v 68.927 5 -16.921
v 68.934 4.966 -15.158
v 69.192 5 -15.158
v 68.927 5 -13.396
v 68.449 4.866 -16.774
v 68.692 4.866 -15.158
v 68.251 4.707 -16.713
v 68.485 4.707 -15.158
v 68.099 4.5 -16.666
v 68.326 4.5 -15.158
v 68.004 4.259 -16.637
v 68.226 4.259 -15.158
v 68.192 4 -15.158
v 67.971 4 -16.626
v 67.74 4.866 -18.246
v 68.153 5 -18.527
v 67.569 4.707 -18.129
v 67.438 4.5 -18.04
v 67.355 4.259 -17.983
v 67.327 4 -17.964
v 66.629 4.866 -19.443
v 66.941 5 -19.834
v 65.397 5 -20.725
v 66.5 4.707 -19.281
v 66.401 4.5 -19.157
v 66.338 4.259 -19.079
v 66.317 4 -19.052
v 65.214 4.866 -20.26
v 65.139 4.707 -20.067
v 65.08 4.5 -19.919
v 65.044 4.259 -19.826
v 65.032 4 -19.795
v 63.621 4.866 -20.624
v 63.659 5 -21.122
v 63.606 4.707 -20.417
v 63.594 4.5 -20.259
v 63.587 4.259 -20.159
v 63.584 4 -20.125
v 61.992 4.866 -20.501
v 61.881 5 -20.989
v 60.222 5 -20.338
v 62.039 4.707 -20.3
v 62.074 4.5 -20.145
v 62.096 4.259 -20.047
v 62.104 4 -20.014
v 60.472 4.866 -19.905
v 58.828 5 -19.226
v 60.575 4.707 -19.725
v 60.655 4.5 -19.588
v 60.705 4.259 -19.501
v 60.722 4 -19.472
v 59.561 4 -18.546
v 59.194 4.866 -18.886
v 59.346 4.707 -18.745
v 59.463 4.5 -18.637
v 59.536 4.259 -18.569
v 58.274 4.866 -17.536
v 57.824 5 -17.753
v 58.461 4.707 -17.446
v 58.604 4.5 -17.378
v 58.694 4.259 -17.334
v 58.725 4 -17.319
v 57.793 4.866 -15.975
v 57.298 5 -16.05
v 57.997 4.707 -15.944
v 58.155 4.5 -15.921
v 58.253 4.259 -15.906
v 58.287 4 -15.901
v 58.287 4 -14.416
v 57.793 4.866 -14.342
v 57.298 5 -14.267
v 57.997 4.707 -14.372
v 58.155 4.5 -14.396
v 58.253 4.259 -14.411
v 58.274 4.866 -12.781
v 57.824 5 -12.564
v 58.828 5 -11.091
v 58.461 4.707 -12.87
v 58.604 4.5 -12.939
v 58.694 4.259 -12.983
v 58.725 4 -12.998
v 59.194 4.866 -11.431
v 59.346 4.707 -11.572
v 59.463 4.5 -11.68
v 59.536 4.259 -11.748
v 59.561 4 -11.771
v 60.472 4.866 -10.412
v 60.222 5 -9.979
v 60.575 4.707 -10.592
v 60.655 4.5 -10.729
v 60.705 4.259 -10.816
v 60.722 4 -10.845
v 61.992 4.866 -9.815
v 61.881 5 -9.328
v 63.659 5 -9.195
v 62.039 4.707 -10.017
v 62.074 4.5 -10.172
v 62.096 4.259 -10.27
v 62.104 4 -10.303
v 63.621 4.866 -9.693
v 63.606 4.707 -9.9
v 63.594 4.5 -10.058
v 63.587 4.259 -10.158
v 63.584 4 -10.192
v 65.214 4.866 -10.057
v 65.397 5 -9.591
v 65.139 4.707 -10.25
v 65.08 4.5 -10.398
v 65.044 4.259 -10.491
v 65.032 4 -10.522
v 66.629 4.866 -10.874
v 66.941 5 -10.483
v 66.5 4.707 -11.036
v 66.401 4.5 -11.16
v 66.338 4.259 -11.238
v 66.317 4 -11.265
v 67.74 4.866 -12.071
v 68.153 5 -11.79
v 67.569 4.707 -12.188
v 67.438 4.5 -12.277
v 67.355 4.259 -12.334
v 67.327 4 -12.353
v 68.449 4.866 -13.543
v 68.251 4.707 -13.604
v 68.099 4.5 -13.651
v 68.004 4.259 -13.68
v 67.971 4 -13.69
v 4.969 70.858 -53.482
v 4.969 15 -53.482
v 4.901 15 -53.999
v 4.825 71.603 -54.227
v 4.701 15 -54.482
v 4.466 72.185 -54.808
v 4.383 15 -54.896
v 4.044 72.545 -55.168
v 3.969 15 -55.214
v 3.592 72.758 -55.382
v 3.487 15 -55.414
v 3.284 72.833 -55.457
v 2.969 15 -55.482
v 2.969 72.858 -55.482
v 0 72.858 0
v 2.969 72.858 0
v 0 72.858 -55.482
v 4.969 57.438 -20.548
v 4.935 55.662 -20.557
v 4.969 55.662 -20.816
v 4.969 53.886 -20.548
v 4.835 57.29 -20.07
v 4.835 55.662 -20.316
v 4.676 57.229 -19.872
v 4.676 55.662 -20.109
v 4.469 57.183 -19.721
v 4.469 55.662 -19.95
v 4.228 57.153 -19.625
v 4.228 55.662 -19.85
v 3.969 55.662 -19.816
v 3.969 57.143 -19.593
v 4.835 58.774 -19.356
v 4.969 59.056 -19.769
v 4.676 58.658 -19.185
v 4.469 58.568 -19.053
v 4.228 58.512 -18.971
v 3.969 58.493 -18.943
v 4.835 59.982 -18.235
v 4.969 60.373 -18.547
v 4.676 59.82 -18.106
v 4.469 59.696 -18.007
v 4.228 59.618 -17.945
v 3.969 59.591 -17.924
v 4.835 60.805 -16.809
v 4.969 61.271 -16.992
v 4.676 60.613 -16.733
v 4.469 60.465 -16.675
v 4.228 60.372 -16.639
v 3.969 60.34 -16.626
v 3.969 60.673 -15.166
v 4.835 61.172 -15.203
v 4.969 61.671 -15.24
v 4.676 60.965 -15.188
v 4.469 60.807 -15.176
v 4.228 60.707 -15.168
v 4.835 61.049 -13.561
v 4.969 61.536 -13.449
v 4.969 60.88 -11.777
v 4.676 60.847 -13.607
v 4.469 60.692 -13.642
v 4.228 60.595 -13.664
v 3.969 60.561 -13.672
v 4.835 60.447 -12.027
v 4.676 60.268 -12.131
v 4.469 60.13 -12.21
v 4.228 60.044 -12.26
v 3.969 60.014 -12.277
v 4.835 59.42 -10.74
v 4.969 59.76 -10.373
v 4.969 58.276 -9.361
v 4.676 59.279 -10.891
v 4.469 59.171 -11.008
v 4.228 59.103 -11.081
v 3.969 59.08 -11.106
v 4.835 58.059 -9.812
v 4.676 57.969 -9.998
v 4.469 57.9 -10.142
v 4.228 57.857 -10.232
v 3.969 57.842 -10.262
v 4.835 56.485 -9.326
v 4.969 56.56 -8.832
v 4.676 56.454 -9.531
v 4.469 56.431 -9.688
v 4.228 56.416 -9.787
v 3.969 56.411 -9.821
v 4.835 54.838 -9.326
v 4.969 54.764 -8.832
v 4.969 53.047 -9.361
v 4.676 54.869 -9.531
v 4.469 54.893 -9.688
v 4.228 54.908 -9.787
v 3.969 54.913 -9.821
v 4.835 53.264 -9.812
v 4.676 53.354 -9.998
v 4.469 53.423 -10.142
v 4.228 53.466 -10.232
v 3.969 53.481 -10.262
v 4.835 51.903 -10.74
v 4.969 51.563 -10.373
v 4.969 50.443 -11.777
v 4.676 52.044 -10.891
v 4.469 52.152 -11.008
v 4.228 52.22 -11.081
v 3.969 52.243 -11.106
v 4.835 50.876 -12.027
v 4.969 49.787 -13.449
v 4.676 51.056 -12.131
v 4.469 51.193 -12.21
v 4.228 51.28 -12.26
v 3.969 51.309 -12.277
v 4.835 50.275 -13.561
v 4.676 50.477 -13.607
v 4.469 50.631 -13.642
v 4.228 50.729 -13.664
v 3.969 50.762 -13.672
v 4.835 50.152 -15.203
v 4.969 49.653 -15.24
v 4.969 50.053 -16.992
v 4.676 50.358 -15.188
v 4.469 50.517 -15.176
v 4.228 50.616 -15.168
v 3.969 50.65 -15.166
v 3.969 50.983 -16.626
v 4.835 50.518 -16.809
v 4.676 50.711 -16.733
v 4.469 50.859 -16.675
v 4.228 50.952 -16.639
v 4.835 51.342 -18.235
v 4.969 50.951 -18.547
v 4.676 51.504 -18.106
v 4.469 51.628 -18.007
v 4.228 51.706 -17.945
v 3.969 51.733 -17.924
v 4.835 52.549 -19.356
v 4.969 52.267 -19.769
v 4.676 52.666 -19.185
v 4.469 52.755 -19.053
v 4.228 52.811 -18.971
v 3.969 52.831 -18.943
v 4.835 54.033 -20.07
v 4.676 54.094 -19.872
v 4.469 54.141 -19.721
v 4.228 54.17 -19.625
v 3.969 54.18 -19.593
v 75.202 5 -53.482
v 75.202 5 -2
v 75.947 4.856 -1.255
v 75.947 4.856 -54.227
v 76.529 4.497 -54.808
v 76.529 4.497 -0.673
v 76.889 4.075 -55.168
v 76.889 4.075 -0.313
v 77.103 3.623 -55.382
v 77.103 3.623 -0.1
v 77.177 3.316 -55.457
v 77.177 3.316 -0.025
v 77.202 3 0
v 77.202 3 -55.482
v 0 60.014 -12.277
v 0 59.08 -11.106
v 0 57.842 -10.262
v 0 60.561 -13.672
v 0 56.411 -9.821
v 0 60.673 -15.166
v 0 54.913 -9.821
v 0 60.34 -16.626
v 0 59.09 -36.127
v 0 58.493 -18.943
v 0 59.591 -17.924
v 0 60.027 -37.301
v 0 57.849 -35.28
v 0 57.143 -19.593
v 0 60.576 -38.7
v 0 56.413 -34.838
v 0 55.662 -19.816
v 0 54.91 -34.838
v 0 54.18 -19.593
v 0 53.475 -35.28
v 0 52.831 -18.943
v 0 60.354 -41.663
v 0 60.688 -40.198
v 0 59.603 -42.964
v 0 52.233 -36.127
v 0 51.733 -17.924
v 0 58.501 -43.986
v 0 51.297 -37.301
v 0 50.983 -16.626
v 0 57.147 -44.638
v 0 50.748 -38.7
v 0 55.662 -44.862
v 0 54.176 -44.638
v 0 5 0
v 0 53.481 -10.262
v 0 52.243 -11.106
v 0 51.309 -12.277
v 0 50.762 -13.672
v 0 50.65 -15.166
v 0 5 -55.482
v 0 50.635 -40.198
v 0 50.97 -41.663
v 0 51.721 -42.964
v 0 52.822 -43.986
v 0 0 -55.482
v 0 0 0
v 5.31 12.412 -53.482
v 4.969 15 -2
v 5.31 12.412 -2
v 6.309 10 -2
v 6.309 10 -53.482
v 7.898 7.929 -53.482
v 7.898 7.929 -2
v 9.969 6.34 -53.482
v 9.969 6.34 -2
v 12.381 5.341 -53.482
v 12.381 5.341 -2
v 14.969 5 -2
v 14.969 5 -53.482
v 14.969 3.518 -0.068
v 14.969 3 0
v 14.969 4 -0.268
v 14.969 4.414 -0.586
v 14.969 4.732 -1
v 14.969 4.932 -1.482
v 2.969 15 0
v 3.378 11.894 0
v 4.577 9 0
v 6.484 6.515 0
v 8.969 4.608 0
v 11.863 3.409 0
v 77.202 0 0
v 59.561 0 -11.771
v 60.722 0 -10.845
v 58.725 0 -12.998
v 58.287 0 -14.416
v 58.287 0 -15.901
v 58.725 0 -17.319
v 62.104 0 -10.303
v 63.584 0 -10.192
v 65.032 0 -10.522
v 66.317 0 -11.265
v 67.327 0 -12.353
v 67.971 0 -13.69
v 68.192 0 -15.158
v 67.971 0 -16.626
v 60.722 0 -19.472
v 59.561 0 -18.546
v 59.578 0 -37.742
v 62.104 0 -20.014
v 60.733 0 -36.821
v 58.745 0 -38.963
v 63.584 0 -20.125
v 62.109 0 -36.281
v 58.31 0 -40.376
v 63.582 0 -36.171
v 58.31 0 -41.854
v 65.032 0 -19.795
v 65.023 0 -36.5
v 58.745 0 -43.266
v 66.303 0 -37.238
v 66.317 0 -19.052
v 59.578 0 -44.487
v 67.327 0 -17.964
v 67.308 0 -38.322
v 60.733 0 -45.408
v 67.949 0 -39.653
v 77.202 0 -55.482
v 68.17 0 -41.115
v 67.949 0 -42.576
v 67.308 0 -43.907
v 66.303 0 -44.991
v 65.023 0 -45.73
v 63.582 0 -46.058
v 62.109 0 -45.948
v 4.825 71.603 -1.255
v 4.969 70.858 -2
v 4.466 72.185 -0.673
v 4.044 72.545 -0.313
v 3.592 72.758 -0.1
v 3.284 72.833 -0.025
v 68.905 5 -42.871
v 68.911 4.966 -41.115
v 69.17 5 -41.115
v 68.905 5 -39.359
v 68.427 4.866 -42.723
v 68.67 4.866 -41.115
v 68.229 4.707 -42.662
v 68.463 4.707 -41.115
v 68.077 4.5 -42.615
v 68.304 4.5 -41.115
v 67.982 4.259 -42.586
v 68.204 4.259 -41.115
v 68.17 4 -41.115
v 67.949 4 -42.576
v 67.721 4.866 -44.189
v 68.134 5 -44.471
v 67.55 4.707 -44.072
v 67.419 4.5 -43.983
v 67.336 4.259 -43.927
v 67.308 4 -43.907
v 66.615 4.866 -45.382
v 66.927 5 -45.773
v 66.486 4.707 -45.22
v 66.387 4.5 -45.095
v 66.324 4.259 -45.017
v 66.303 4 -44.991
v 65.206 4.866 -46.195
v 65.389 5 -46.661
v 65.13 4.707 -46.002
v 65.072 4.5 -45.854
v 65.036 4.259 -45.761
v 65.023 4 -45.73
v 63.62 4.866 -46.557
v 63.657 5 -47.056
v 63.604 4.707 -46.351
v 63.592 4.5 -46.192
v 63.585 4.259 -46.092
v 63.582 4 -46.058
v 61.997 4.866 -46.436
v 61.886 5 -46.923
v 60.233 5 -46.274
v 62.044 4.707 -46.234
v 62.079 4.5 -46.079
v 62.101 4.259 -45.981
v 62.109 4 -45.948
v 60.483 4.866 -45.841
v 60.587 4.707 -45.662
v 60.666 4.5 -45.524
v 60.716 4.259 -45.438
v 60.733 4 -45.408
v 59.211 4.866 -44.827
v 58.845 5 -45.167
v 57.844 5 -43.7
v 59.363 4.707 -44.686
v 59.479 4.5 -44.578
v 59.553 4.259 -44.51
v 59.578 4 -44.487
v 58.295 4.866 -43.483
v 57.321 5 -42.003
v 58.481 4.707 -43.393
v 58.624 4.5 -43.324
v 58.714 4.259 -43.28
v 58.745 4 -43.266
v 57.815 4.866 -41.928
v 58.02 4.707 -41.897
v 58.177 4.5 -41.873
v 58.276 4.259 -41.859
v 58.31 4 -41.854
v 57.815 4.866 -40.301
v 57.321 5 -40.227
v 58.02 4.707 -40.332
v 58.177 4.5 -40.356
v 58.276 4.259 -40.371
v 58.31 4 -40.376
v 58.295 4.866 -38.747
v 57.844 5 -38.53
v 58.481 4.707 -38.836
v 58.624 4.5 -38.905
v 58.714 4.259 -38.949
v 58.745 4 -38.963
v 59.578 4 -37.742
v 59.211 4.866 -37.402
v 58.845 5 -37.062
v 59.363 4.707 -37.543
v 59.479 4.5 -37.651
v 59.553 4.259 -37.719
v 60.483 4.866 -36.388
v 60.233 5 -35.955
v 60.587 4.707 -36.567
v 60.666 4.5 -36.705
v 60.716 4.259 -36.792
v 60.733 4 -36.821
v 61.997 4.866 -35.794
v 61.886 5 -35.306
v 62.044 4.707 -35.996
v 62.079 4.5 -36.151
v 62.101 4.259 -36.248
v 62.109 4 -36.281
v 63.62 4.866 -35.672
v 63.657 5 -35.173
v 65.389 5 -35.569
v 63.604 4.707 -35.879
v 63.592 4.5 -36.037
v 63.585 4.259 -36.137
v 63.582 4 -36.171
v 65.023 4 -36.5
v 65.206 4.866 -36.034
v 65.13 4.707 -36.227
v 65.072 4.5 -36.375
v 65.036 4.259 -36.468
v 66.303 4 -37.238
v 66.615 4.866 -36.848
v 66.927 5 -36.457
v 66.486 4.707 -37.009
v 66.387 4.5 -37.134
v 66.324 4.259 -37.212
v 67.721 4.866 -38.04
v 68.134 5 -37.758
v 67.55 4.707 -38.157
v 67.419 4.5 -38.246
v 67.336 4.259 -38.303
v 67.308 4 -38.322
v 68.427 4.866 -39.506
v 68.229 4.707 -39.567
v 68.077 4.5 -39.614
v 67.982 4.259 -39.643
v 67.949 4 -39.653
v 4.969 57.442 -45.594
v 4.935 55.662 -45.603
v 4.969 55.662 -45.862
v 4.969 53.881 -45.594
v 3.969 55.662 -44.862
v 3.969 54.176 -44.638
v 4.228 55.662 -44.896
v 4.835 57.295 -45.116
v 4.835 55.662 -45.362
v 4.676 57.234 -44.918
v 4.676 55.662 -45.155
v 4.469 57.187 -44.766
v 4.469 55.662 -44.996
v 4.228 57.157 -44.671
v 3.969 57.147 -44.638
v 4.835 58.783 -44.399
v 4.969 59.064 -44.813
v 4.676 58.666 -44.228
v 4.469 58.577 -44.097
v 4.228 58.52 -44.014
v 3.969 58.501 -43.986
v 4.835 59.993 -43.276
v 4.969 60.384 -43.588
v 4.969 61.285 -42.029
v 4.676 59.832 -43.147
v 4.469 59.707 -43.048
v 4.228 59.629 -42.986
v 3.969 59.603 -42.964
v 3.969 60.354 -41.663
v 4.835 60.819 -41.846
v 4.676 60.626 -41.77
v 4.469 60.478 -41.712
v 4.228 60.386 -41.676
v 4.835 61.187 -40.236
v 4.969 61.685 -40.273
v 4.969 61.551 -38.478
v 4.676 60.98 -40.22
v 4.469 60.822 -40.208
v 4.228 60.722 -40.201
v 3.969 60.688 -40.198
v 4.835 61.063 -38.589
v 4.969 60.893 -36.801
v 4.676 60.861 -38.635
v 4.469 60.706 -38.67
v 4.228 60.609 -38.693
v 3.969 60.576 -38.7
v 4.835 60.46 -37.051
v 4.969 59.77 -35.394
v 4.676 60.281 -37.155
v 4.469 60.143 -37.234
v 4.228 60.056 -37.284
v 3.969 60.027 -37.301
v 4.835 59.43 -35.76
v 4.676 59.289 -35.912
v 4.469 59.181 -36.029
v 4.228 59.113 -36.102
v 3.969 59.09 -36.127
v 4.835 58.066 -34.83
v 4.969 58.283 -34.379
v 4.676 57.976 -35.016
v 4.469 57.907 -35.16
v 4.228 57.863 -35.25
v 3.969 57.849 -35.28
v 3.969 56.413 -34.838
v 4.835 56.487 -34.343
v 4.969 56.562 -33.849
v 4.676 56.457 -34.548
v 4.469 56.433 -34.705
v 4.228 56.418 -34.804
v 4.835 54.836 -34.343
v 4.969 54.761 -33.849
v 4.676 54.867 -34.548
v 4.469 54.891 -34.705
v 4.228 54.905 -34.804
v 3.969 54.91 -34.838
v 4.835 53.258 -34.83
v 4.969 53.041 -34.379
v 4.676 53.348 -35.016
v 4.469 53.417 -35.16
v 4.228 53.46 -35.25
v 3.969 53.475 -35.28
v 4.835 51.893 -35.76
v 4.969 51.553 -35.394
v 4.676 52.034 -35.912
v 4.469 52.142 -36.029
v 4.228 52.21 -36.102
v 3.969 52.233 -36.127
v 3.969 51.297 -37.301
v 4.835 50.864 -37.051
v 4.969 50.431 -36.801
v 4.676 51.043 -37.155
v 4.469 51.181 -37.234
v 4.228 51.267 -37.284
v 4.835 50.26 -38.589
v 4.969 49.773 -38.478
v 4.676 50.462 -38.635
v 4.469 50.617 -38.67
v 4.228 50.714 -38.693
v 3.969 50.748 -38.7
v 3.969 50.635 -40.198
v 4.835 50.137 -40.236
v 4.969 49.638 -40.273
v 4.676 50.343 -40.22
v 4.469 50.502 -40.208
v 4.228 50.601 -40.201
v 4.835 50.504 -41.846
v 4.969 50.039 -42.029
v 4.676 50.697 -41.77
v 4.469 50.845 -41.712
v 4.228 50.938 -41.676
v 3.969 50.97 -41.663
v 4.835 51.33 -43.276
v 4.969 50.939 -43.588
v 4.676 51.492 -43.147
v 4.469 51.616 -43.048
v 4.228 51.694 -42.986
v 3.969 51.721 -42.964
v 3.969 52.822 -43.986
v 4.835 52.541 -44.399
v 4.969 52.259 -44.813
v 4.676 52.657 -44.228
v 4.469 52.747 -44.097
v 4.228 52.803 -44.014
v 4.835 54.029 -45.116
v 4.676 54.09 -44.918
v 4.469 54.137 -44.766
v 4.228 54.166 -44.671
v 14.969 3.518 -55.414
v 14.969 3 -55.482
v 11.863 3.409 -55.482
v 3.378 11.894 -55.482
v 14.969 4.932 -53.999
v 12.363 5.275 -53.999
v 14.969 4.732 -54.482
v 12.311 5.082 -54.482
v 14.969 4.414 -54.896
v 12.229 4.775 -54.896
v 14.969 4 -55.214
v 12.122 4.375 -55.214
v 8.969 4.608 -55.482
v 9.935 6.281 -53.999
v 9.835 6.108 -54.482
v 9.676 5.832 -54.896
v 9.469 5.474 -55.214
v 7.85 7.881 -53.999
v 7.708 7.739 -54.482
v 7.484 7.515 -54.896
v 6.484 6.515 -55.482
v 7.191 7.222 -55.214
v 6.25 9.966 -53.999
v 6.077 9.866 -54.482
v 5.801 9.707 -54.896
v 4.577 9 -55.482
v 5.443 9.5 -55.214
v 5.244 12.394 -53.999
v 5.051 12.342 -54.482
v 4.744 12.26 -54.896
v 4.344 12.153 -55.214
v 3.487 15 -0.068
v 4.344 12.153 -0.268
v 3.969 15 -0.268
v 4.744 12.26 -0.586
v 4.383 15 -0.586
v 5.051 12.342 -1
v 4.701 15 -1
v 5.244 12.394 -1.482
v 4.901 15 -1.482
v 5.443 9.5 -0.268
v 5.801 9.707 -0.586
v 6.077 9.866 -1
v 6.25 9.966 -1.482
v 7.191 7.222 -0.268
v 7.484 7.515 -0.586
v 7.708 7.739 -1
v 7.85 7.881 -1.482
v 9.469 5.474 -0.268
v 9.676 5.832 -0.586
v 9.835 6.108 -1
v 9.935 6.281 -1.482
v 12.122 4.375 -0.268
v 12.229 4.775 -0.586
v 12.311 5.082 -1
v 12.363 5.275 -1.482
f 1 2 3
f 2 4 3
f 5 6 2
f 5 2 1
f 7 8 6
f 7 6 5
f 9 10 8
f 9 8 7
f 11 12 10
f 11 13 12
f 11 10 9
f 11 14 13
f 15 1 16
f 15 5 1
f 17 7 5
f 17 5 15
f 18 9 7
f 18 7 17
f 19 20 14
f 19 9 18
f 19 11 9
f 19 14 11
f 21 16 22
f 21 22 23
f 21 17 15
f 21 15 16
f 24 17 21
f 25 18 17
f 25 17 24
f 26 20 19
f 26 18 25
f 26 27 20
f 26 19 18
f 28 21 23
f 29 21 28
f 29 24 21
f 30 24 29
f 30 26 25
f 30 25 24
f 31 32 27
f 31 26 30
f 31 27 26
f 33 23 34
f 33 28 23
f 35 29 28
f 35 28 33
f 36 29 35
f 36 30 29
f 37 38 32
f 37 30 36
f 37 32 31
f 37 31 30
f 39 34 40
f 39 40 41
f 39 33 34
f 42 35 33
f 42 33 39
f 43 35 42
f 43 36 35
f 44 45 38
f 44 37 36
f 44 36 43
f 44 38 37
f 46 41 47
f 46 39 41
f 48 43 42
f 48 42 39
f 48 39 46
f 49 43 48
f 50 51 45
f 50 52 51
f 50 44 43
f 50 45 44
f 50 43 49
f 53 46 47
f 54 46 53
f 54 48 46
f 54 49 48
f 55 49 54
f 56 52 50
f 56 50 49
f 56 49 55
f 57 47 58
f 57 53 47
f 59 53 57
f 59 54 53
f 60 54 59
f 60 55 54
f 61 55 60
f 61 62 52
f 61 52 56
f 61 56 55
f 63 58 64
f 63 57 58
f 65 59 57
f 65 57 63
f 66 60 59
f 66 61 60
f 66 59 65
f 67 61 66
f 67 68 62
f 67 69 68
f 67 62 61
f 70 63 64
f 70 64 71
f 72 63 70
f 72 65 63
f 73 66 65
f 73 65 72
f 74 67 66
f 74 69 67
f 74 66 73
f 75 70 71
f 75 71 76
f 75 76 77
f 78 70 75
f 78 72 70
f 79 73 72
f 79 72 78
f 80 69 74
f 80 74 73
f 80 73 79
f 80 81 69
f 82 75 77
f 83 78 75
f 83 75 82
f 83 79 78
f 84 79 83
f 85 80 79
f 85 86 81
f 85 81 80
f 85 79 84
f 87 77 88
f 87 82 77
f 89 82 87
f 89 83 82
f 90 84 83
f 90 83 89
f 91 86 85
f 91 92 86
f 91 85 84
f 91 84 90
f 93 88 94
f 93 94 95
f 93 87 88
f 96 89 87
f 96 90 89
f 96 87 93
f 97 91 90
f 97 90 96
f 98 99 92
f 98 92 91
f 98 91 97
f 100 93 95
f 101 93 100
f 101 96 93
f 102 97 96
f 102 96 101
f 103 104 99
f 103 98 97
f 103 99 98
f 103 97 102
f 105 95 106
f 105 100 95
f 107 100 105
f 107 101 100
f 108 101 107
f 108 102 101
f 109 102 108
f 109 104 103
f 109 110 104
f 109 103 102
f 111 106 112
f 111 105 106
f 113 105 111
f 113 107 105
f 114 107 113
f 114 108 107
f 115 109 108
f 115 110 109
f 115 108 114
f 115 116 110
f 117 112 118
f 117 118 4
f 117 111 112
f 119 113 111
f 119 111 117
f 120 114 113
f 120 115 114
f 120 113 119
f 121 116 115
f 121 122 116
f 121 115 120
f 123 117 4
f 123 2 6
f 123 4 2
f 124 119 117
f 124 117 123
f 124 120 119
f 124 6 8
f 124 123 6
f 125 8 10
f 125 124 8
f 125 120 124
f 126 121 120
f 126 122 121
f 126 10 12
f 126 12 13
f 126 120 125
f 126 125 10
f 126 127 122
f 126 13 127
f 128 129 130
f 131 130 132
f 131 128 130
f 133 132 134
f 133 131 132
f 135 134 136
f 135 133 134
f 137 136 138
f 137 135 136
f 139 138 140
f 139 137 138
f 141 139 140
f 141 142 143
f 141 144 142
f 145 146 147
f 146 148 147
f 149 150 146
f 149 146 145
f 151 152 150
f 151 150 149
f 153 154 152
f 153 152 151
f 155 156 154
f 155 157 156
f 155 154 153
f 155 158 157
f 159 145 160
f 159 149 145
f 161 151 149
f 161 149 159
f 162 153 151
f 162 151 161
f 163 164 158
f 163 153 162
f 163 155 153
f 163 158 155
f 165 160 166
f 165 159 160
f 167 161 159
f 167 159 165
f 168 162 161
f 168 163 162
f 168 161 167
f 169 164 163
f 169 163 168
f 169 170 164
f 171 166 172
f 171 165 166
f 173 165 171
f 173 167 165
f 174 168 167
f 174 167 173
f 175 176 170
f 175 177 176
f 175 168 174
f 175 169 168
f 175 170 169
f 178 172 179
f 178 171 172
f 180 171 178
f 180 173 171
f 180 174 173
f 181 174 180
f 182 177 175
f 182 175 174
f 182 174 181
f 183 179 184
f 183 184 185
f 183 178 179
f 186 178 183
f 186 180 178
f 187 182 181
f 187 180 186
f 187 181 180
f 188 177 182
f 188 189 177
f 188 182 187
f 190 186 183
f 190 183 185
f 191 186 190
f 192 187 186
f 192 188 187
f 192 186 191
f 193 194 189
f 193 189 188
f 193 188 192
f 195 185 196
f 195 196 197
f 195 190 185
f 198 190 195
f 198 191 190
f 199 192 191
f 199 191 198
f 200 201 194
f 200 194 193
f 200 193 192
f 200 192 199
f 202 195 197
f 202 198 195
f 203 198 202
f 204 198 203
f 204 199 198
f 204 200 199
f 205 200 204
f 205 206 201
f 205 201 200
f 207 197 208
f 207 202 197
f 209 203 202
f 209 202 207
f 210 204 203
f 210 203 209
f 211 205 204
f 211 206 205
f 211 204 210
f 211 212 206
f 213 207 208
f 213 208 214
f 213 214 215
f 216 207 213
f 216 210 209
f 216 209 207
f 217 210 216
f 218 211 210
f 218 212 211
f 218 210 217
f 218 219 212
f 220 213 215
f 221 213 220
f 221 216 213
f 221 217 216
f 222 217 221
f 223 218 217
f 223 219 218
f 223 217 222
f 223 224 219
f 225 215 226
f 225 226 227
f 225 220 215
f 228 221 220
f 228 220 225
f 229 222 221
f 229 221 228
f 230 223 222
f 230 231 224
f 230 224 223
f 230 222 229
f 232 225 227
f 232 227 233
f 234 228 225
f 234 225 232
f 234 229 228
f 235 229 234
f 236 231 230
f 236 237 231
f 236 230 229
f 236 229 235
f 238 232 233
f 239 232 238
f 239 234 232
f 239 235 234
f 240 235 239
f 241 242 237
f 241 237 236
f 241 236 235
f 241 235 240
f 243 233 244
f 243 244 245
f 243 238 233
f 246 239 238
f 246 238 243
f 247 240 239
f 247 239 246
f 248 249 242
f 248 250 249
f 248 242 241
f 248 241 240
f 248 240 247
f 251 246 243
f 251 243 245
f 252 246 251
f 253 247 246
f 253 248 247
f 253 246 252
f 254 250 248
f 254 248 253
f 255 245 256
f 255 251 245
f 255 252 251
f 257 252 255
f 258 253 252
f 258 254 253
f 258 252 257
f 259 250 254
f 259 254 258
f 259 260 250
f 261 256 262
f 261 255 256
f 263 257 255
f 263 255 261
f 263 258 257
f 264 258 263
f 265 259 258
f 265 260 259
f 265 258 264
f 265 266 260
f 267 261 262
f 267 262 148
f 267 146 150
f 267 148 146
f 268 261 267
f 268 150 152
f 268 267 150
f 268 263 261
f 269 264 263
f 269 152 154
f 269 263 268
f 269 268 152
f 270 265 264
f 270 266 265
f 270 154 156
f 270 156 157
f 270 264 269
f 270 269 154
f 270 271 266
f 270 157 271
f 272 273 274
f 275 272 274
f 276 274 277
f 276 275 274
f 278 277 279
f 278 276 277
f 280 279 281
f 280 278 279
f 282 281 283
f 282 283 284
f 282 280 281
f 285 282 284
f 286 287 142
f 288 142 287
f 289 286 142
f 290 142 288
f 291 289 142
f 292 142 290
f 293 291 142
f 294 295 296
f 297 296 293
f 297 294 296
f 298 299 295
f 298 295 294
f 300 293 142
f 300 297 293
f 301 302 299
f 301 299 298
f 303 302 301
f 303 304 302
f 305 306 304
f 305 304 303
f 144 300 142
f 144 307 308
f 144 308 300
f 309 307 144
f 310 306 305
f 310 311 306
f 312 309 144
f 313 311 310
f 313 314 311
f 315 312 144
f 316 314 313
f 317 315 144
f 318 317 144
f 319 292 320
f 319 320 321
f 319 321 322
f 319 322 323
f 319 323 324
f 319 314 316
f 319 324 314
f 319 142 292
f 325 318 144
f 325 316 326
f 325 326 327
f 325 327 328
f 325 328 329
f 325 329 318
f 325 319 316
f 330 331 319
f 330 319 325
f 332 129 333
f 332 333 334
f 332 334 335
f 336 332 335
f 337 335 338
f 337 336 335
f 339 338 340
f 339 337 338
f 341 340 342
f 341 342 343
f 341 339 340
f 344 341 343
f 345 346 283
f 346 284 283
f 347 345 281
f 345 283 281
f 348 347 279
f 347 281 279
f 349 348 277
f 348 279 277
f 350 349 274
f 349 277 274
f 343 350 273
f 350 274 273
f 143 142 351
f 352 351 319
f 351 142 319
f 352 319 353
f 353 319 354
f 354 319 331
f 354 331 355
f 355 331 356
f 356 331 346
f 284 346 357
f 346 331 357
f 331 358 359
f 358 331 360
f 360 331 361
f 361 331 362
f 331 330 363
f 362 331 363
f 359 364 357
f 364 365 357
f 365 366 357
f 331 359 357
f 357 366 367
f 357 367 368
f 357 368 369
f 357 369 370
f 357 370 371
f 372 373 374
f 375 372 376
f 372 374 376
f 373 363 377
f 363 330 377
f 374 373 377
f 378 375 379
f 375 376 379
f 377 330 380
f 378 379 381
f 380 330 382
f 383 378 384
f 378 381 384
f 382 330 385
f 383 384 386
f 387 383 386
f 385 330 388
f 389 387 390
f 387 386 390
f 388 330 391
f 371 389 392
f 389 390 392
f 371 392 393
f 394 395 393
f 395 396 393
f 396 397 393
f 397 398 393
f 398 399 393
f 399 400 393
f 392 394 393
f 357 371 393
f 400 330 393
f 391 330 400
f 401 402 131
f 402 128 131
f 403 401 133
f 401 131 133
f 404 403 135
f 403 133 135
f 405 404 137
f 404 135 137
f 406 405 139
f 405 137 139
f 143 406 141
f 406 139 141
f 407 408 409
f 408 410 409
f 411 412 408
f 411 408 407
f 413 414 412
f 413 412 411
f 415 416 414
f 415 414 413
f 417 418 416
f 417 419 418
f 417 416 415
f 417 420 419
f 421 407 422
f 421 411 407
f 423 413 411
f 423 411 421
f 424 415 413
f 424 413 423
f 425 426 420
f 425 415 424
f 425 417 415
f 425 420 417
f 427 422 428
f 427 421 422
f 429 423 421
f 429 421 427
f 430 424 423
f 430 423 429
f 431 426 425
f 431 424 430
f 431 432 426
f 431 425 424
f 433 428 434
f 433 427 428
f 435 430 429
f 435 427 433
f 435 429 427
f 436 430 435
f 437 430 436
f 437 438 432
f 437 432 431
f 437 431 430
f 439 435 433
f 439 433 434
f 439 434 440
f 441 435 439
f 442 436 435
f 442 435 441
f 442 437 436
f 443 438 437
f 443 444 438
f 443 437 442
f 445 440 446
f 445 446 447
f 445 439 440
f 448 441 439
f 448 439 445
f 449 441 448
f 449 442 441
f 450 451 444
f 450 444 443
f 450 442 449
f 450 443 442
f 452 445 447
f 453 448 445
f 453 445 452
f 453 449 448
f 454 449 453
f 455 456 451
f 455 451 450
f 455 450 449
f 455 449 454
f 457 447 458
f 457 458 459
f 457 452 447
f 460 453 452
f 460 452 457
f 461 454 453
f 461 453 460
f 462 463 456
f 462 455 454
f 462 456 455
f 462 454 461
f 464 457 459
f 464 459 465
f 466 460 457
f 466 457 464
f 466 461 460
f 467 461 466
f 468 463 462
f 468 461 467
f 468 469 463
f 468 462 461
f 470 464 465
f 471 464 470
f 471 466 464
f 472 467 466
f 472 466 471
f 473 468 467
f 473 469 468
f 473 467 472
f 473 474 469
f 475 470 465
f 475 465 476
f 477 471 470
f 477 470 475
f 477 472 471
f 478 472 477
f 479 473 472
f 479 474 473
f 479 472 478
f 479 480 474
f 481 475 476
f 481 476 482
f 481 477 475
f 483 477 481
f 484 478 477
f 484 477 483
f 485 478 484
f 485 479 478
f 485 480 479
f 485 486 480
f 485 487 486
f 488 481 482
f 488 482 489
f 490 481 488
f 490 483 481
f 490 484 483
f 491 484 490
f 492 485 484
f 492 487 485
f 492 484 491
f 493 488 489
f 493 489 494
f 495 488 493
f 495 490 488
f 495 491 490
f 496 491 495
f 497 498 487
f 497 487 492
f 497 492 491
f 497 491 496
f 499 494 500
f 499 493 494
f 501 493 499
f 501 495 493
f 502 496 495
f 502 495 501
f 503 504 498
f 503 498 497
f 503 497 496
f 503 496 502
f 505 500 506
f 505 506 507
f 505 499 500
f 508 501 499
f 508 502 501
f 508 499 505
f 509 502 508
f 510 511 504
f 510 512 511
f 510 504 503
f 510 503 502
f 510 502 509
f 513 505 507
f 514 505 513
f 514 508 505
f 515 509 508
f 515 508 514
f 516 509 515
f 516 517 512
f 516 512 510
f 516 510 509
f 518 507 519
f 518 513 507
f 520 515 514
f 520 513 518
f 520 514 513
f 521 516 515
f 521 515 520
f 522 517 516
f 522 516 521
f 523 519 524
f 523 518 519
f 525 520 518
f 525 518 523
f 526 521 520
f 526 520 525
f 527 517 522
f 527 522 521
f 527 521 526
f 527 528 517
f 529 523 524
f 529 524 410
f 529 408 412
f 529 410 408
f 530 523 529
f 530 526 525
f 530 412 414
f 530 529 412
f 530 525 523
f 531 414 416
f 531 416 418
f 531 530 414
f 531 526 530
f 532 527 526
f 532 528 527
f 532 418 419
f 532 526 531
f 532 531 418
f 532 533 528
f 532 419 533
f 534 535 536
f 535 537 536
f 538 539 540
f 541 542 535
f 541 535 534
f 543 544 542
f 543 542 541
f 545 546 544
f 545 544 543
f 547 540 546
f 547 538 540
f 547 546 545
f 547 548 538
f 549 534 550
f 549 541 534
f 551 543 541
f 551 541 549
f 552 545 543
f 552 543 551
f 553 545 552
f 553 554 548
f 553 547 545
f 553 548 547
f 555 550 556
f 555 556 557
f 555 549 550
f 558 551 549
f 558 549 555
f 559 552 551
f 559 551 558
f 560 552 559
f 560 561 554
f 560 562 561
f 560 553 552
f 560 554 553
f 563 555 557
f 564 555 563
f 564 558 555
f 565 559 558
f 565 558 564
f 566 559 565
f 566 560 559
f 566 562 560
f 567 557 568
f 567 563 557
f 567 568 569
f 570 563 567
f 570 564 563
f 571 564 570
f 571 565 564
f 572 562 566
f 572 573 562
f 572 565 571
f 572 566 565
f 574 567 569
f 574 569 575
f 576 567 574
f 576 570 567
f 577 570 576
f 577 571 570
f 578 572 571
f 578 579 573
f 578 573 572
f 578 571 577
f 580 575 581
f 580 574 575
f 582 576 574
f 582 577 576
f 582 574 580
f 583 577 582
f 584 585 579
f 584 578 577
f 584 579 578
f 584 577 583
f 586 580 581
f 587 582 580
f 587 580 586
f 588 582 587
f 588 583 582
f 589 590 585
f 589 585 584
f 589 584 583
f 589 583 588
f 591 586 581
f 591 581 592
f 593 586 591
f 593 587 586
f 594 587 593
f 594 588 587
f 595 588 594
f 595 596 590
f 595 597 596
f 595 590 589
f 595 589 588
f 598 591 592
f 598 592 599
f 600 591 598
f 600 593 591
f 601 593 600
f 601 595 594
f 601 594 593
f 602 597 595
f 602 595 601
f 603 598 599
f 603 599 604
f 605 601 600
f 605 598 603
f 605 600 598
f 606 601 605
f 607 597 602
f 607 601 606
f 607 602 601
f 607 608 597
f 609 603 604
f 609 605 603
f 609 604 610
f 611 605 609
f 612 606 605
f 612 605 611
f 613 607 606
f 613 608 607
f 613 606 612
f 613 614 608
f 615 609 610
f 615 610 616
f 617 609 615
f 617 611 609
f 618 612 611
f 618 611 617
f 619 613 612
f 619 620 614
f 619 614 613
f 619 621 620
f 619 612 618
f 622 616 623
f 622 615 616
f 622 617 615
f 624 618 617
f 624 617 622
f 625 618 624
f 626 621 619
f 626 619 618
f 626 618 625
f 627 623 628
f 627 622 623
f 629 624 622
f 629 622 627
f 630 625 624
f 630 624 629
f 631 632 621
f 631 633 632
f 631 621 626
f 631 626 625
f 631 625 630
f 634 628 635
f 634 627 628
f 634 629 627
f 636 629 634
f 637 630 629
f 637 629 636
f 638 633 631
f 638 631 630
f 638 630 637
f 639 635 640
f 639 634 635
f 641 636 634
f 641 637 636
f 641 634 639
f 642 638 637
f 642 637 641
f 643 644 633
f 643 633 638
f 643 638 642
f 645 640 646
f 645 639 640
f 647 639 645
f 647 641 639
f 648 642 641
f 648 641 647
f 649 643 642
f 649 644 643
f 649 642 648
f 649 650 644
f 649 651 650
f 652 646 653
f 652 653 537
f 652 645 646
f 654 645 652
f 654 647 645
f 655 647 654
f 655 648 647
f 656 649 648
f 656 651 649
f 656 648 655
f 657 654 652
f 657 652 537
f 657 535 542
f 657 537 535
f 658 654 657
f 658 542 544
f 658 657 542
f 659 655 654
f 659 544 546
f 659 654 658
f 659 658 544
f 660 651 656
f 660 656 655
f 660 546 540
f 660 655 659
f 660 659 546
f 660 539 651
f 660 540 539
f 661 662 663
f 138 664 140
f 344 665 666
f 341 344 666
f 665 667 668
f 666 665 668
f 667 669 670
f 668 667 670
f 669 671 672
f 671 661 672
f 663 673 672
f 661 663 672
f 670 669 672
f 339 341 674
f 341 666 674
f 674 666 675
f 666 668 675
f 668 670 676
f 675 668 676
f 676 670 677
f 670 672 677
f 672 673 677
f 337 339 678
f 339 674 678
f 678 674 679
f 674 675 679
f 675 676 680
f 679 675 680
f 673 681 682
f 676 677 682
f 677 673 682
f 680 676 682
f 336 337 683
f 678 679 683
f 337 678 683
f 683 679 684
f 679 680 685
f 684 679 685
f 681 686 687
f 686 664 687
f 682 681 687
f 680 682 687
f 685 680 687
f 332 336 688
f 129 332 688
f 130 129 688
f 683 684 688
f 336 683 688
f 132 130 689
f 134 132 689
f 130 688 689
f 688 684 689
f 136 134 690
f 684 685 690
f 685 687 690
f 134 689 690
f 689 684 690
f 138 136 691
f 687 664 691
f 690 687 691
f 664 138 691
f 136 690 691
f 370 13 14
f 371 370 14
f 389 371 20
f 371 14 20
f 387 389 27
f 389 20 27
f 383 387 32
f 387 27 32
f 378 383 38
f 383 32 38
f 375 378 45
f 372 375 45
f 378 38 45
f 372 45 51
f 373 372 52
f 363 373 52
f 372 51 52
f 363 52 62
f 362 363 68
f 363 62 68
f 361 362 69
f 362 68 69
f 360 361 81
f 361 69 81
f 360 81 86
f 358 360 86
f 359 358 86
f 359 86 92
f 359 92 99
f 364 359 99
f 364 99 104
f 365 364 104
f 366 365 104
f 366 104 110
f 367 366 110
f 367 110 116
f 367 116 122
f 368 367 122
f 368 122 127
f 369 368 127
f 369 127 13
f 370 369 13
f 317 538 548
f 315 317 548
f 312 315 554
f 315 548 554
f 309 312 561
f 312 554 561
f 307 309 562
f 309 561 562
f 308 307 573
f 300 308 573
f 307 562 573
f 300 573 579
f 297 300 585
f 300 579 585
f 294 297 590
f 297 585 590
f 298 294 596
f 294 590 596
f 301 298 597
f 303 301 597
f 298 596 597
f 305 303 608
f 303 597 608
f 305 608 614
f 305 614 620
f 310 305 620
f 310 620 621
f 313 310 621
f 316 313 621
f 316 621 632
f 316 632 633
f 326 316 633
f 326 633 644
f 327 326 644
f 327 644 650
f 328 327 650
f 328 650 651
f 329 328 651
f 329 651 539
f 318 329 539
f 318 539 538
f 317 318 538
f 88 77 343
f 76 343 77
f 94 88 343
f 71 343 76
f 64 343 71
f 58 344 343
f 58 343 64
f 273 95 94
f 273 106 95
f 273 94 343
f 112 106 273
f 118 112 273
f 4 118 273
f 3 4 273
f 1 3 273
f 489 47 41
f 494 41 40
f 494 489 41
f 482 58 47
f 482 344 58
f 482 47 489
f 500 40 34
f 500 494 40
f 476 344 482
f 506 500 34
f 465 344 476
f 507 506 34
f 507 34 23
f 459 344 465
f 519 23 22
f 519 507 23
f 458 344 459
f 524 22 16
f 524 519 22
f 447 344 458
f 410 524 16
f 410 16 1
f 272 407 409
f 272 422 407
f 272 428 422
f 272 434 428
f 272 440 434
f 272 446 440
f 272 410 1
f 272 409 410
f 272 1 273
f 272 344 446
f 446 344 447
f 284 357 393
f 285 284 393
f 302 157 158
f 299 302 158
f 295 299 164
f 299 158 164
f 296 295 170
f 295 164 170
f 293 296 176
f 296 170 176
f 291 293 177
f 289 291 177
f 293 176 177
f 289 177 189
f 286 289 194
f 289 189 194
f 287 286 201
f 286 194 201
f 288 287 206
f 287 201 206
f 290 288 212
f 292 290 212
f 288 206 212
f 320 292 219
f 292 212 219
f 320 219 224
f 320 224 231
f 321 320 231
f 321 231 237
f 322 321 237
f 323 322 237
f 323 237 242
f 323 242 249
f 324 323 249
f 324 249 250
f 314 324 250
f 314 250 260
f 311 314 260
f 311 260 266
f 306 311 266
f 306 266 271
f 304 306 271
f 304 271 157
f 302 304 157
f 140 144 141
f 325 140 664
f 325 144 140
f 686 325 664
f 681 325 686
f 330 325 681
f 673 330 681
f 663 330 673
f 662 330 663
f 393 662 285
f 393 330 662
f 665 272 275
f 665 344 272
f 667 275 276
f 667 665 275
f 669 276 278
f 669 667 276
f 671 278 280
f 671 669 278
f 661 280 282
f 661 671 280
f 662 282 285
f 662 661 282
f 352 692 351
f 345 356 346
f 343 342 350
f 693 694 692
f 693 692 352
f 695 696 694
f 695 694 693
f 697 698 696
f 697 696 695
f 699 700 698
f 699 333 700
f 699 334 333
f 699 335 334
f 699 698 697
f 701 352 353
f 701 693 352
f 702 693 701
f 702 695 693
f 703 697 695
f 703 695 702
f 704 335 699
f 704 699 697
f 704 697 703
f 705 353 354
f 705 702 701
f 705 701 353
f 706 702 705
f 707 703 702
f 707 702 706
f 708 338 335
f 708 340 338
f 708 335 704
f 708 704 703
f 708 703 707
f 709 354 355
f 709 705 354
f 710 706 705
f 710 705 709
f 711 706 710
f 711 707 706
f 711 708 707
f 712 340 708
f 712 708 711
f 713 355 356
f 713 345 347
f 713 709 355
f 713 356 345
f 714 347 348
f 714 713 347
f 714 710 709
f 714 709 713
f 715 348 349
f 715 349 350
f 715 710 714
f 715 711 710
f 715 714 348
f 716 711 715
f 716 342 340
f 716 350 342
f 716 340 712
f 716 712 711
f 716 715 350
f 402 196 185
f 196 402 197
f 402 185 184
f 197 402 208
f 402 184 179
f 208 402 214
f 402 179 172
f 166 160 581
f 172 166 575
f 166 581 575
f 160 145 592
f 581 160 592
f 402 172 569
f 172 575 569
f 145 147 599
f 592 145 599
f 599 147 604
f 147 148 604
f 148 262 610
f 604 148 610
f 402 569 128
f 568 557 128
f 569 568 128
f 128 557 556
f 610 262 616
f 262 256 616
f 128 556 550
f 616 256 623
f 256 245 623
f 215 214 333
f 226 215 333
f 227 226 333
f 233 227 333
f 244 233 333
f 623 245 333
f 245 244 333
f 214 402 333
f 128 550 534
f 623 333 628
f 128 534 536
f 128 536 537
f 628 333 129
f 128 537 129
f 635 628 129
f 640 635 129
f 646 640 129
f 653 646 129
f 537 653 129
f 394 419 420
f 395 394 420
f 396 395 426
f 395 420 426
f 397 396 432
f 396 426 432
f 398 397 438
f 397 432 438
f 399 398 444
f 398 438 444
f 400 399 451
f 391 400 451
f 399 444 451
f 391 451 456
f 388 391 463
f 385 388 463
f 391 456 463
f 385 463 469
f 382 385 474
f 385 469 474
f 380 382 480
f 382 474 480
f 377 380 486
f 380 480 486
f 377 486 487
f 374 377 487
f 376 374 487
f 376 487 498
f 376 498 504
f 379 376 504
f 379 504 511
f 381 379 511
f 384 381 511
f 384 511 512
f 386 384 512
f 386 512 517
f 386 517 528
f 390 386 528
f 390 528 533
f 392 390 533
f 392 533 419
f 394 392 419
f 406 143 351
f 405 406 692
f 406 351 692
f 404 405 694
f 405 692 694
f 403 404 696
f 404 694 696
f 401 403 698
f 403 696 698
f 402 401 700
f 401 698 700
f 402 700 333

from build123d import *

# Parameters (mm, degrees)
SKETCH1_W           = 77.202171331
SKETCH1_H           = 55.481682761
BOSS_EXTRUDE1_DEPTH = 5
SKETCH2_W           = 4.968888078
SKETCH2_H           = 55.481682761
BOSS_EXTRUDE2_DEPTH = 67.858
SKETCH3_R           = 4.957767387
SKETCH3_R_2         = 4.980451749
CUT_EXTRUDE1_DEPTH  = 67.858
SKETCH4_R           = 5.025637378
SKETCH4_R_2         = 5.040484197
CUT_EXTRUDE2_DEPTH  = 67.858
FILLET1_R           = 10
FILLET2_R           = 2
FILLET3_R           = 1


with BuildPart() as part:
    # Sketch1 → Boss-Extrude1 (new body)
    with BuildSketch(Plane(origin=(0, 0, 0), x_dir=(1, 0, 0), z_dir=(0, 1, 0))):
        with Locations((38.601085666, 27.740841381)):
            Rectangle(SKETCH1_W, SKETCH1_H)
    extrude(amount=BOSS_EXTRUDE1_DEPTH)

    # Sketch2 → Boss-Extrude2 (add)
    with BuildSketch(Plane(origin=(0, 5, 0), x_dir=(1, 0, 0), z_dir=(0, 1, 0))):
        with Locations((2.484444039, 27.740841381)):
            Rectangle(SKETCH2_W, SKETCH2_H)
    extrude(amount=BOSS_EXTRUDE2_DEPTH)

    # Sketch3 → Cut-Extrude1 (cut)
    with BuildSketch(Plane(origin=(0, 5, 0), x_dir=(1, 0, 0), z_dir=(0, 1, 0))):
        with Locations((63.211940842, 41.114585833)):
            Circle(SKETCH3_R)
        with Locations((63.211940842, 15.158442754)):
            Circle(SKETCH3_R_2)
    extrude(amount=-CUT_EXTRUDE1_DEPTH, mode=Mode.SUBTRACT)

    # Sketch4 → Cut-Extrude2 (cut)
    with BuildSketch(Plane(origin=(4.968888078, 0, 0), x_dir=(0, 0, -1), z_dir=(1, 0, 0))):
        with Locations((14.790160446, 55.661727657)):
            Circle(SKETCH4_R)
        with Locations((39.821700462, 55.661727657)):
            Circle(SKETCH4_R_2)
    extrude(amount=-CUT_EXTRUDE2_DEPTH, mode=Mode.SUBTRACT)

    # Fillet1
    fillet1_edges = [part.edges().sort_by_distance(p)[0] for p in [
        (4.968888078, 5, -27.74084138),
    ]]
    fillet(fillet1_edges, radius=FILLET1_R)

    # Fillet2
    fillet2_edges = [part.edges().sort_by_distance(p)[0] for p in [
        (4.968888078, 72.858, -27.74084138),
        (4.968888078, 43.929, -55.481682761),
        (7.897820266, 7.928932188, -55.481682761),
        (46.085529705, 5, -55.481682761),
        (77.202171331, 5, -27.74084138),
        (46.085529705, 5, 0),
        (7.897820266, 7.928932188, 0),
        (4.968888078, 43.929, 0),
    ]]
    fillet(fillet2_edges, radius=FILLET2_R)

    # Fillet3
    fillet3_edges = [part.edges().sort_by_distance(p)[0] for p in [
        (58.254173454, 5, -41.114585833),
        (58.231489093, 5, -15.158442754),
        (4.968888078, 55.661727657, -9.764523068),
        (4.968888078, 55.661727657, -34.781216265),
    ]]
    fillet(fillet3_edges, radius=FILLET3_R)


solid = part.part
